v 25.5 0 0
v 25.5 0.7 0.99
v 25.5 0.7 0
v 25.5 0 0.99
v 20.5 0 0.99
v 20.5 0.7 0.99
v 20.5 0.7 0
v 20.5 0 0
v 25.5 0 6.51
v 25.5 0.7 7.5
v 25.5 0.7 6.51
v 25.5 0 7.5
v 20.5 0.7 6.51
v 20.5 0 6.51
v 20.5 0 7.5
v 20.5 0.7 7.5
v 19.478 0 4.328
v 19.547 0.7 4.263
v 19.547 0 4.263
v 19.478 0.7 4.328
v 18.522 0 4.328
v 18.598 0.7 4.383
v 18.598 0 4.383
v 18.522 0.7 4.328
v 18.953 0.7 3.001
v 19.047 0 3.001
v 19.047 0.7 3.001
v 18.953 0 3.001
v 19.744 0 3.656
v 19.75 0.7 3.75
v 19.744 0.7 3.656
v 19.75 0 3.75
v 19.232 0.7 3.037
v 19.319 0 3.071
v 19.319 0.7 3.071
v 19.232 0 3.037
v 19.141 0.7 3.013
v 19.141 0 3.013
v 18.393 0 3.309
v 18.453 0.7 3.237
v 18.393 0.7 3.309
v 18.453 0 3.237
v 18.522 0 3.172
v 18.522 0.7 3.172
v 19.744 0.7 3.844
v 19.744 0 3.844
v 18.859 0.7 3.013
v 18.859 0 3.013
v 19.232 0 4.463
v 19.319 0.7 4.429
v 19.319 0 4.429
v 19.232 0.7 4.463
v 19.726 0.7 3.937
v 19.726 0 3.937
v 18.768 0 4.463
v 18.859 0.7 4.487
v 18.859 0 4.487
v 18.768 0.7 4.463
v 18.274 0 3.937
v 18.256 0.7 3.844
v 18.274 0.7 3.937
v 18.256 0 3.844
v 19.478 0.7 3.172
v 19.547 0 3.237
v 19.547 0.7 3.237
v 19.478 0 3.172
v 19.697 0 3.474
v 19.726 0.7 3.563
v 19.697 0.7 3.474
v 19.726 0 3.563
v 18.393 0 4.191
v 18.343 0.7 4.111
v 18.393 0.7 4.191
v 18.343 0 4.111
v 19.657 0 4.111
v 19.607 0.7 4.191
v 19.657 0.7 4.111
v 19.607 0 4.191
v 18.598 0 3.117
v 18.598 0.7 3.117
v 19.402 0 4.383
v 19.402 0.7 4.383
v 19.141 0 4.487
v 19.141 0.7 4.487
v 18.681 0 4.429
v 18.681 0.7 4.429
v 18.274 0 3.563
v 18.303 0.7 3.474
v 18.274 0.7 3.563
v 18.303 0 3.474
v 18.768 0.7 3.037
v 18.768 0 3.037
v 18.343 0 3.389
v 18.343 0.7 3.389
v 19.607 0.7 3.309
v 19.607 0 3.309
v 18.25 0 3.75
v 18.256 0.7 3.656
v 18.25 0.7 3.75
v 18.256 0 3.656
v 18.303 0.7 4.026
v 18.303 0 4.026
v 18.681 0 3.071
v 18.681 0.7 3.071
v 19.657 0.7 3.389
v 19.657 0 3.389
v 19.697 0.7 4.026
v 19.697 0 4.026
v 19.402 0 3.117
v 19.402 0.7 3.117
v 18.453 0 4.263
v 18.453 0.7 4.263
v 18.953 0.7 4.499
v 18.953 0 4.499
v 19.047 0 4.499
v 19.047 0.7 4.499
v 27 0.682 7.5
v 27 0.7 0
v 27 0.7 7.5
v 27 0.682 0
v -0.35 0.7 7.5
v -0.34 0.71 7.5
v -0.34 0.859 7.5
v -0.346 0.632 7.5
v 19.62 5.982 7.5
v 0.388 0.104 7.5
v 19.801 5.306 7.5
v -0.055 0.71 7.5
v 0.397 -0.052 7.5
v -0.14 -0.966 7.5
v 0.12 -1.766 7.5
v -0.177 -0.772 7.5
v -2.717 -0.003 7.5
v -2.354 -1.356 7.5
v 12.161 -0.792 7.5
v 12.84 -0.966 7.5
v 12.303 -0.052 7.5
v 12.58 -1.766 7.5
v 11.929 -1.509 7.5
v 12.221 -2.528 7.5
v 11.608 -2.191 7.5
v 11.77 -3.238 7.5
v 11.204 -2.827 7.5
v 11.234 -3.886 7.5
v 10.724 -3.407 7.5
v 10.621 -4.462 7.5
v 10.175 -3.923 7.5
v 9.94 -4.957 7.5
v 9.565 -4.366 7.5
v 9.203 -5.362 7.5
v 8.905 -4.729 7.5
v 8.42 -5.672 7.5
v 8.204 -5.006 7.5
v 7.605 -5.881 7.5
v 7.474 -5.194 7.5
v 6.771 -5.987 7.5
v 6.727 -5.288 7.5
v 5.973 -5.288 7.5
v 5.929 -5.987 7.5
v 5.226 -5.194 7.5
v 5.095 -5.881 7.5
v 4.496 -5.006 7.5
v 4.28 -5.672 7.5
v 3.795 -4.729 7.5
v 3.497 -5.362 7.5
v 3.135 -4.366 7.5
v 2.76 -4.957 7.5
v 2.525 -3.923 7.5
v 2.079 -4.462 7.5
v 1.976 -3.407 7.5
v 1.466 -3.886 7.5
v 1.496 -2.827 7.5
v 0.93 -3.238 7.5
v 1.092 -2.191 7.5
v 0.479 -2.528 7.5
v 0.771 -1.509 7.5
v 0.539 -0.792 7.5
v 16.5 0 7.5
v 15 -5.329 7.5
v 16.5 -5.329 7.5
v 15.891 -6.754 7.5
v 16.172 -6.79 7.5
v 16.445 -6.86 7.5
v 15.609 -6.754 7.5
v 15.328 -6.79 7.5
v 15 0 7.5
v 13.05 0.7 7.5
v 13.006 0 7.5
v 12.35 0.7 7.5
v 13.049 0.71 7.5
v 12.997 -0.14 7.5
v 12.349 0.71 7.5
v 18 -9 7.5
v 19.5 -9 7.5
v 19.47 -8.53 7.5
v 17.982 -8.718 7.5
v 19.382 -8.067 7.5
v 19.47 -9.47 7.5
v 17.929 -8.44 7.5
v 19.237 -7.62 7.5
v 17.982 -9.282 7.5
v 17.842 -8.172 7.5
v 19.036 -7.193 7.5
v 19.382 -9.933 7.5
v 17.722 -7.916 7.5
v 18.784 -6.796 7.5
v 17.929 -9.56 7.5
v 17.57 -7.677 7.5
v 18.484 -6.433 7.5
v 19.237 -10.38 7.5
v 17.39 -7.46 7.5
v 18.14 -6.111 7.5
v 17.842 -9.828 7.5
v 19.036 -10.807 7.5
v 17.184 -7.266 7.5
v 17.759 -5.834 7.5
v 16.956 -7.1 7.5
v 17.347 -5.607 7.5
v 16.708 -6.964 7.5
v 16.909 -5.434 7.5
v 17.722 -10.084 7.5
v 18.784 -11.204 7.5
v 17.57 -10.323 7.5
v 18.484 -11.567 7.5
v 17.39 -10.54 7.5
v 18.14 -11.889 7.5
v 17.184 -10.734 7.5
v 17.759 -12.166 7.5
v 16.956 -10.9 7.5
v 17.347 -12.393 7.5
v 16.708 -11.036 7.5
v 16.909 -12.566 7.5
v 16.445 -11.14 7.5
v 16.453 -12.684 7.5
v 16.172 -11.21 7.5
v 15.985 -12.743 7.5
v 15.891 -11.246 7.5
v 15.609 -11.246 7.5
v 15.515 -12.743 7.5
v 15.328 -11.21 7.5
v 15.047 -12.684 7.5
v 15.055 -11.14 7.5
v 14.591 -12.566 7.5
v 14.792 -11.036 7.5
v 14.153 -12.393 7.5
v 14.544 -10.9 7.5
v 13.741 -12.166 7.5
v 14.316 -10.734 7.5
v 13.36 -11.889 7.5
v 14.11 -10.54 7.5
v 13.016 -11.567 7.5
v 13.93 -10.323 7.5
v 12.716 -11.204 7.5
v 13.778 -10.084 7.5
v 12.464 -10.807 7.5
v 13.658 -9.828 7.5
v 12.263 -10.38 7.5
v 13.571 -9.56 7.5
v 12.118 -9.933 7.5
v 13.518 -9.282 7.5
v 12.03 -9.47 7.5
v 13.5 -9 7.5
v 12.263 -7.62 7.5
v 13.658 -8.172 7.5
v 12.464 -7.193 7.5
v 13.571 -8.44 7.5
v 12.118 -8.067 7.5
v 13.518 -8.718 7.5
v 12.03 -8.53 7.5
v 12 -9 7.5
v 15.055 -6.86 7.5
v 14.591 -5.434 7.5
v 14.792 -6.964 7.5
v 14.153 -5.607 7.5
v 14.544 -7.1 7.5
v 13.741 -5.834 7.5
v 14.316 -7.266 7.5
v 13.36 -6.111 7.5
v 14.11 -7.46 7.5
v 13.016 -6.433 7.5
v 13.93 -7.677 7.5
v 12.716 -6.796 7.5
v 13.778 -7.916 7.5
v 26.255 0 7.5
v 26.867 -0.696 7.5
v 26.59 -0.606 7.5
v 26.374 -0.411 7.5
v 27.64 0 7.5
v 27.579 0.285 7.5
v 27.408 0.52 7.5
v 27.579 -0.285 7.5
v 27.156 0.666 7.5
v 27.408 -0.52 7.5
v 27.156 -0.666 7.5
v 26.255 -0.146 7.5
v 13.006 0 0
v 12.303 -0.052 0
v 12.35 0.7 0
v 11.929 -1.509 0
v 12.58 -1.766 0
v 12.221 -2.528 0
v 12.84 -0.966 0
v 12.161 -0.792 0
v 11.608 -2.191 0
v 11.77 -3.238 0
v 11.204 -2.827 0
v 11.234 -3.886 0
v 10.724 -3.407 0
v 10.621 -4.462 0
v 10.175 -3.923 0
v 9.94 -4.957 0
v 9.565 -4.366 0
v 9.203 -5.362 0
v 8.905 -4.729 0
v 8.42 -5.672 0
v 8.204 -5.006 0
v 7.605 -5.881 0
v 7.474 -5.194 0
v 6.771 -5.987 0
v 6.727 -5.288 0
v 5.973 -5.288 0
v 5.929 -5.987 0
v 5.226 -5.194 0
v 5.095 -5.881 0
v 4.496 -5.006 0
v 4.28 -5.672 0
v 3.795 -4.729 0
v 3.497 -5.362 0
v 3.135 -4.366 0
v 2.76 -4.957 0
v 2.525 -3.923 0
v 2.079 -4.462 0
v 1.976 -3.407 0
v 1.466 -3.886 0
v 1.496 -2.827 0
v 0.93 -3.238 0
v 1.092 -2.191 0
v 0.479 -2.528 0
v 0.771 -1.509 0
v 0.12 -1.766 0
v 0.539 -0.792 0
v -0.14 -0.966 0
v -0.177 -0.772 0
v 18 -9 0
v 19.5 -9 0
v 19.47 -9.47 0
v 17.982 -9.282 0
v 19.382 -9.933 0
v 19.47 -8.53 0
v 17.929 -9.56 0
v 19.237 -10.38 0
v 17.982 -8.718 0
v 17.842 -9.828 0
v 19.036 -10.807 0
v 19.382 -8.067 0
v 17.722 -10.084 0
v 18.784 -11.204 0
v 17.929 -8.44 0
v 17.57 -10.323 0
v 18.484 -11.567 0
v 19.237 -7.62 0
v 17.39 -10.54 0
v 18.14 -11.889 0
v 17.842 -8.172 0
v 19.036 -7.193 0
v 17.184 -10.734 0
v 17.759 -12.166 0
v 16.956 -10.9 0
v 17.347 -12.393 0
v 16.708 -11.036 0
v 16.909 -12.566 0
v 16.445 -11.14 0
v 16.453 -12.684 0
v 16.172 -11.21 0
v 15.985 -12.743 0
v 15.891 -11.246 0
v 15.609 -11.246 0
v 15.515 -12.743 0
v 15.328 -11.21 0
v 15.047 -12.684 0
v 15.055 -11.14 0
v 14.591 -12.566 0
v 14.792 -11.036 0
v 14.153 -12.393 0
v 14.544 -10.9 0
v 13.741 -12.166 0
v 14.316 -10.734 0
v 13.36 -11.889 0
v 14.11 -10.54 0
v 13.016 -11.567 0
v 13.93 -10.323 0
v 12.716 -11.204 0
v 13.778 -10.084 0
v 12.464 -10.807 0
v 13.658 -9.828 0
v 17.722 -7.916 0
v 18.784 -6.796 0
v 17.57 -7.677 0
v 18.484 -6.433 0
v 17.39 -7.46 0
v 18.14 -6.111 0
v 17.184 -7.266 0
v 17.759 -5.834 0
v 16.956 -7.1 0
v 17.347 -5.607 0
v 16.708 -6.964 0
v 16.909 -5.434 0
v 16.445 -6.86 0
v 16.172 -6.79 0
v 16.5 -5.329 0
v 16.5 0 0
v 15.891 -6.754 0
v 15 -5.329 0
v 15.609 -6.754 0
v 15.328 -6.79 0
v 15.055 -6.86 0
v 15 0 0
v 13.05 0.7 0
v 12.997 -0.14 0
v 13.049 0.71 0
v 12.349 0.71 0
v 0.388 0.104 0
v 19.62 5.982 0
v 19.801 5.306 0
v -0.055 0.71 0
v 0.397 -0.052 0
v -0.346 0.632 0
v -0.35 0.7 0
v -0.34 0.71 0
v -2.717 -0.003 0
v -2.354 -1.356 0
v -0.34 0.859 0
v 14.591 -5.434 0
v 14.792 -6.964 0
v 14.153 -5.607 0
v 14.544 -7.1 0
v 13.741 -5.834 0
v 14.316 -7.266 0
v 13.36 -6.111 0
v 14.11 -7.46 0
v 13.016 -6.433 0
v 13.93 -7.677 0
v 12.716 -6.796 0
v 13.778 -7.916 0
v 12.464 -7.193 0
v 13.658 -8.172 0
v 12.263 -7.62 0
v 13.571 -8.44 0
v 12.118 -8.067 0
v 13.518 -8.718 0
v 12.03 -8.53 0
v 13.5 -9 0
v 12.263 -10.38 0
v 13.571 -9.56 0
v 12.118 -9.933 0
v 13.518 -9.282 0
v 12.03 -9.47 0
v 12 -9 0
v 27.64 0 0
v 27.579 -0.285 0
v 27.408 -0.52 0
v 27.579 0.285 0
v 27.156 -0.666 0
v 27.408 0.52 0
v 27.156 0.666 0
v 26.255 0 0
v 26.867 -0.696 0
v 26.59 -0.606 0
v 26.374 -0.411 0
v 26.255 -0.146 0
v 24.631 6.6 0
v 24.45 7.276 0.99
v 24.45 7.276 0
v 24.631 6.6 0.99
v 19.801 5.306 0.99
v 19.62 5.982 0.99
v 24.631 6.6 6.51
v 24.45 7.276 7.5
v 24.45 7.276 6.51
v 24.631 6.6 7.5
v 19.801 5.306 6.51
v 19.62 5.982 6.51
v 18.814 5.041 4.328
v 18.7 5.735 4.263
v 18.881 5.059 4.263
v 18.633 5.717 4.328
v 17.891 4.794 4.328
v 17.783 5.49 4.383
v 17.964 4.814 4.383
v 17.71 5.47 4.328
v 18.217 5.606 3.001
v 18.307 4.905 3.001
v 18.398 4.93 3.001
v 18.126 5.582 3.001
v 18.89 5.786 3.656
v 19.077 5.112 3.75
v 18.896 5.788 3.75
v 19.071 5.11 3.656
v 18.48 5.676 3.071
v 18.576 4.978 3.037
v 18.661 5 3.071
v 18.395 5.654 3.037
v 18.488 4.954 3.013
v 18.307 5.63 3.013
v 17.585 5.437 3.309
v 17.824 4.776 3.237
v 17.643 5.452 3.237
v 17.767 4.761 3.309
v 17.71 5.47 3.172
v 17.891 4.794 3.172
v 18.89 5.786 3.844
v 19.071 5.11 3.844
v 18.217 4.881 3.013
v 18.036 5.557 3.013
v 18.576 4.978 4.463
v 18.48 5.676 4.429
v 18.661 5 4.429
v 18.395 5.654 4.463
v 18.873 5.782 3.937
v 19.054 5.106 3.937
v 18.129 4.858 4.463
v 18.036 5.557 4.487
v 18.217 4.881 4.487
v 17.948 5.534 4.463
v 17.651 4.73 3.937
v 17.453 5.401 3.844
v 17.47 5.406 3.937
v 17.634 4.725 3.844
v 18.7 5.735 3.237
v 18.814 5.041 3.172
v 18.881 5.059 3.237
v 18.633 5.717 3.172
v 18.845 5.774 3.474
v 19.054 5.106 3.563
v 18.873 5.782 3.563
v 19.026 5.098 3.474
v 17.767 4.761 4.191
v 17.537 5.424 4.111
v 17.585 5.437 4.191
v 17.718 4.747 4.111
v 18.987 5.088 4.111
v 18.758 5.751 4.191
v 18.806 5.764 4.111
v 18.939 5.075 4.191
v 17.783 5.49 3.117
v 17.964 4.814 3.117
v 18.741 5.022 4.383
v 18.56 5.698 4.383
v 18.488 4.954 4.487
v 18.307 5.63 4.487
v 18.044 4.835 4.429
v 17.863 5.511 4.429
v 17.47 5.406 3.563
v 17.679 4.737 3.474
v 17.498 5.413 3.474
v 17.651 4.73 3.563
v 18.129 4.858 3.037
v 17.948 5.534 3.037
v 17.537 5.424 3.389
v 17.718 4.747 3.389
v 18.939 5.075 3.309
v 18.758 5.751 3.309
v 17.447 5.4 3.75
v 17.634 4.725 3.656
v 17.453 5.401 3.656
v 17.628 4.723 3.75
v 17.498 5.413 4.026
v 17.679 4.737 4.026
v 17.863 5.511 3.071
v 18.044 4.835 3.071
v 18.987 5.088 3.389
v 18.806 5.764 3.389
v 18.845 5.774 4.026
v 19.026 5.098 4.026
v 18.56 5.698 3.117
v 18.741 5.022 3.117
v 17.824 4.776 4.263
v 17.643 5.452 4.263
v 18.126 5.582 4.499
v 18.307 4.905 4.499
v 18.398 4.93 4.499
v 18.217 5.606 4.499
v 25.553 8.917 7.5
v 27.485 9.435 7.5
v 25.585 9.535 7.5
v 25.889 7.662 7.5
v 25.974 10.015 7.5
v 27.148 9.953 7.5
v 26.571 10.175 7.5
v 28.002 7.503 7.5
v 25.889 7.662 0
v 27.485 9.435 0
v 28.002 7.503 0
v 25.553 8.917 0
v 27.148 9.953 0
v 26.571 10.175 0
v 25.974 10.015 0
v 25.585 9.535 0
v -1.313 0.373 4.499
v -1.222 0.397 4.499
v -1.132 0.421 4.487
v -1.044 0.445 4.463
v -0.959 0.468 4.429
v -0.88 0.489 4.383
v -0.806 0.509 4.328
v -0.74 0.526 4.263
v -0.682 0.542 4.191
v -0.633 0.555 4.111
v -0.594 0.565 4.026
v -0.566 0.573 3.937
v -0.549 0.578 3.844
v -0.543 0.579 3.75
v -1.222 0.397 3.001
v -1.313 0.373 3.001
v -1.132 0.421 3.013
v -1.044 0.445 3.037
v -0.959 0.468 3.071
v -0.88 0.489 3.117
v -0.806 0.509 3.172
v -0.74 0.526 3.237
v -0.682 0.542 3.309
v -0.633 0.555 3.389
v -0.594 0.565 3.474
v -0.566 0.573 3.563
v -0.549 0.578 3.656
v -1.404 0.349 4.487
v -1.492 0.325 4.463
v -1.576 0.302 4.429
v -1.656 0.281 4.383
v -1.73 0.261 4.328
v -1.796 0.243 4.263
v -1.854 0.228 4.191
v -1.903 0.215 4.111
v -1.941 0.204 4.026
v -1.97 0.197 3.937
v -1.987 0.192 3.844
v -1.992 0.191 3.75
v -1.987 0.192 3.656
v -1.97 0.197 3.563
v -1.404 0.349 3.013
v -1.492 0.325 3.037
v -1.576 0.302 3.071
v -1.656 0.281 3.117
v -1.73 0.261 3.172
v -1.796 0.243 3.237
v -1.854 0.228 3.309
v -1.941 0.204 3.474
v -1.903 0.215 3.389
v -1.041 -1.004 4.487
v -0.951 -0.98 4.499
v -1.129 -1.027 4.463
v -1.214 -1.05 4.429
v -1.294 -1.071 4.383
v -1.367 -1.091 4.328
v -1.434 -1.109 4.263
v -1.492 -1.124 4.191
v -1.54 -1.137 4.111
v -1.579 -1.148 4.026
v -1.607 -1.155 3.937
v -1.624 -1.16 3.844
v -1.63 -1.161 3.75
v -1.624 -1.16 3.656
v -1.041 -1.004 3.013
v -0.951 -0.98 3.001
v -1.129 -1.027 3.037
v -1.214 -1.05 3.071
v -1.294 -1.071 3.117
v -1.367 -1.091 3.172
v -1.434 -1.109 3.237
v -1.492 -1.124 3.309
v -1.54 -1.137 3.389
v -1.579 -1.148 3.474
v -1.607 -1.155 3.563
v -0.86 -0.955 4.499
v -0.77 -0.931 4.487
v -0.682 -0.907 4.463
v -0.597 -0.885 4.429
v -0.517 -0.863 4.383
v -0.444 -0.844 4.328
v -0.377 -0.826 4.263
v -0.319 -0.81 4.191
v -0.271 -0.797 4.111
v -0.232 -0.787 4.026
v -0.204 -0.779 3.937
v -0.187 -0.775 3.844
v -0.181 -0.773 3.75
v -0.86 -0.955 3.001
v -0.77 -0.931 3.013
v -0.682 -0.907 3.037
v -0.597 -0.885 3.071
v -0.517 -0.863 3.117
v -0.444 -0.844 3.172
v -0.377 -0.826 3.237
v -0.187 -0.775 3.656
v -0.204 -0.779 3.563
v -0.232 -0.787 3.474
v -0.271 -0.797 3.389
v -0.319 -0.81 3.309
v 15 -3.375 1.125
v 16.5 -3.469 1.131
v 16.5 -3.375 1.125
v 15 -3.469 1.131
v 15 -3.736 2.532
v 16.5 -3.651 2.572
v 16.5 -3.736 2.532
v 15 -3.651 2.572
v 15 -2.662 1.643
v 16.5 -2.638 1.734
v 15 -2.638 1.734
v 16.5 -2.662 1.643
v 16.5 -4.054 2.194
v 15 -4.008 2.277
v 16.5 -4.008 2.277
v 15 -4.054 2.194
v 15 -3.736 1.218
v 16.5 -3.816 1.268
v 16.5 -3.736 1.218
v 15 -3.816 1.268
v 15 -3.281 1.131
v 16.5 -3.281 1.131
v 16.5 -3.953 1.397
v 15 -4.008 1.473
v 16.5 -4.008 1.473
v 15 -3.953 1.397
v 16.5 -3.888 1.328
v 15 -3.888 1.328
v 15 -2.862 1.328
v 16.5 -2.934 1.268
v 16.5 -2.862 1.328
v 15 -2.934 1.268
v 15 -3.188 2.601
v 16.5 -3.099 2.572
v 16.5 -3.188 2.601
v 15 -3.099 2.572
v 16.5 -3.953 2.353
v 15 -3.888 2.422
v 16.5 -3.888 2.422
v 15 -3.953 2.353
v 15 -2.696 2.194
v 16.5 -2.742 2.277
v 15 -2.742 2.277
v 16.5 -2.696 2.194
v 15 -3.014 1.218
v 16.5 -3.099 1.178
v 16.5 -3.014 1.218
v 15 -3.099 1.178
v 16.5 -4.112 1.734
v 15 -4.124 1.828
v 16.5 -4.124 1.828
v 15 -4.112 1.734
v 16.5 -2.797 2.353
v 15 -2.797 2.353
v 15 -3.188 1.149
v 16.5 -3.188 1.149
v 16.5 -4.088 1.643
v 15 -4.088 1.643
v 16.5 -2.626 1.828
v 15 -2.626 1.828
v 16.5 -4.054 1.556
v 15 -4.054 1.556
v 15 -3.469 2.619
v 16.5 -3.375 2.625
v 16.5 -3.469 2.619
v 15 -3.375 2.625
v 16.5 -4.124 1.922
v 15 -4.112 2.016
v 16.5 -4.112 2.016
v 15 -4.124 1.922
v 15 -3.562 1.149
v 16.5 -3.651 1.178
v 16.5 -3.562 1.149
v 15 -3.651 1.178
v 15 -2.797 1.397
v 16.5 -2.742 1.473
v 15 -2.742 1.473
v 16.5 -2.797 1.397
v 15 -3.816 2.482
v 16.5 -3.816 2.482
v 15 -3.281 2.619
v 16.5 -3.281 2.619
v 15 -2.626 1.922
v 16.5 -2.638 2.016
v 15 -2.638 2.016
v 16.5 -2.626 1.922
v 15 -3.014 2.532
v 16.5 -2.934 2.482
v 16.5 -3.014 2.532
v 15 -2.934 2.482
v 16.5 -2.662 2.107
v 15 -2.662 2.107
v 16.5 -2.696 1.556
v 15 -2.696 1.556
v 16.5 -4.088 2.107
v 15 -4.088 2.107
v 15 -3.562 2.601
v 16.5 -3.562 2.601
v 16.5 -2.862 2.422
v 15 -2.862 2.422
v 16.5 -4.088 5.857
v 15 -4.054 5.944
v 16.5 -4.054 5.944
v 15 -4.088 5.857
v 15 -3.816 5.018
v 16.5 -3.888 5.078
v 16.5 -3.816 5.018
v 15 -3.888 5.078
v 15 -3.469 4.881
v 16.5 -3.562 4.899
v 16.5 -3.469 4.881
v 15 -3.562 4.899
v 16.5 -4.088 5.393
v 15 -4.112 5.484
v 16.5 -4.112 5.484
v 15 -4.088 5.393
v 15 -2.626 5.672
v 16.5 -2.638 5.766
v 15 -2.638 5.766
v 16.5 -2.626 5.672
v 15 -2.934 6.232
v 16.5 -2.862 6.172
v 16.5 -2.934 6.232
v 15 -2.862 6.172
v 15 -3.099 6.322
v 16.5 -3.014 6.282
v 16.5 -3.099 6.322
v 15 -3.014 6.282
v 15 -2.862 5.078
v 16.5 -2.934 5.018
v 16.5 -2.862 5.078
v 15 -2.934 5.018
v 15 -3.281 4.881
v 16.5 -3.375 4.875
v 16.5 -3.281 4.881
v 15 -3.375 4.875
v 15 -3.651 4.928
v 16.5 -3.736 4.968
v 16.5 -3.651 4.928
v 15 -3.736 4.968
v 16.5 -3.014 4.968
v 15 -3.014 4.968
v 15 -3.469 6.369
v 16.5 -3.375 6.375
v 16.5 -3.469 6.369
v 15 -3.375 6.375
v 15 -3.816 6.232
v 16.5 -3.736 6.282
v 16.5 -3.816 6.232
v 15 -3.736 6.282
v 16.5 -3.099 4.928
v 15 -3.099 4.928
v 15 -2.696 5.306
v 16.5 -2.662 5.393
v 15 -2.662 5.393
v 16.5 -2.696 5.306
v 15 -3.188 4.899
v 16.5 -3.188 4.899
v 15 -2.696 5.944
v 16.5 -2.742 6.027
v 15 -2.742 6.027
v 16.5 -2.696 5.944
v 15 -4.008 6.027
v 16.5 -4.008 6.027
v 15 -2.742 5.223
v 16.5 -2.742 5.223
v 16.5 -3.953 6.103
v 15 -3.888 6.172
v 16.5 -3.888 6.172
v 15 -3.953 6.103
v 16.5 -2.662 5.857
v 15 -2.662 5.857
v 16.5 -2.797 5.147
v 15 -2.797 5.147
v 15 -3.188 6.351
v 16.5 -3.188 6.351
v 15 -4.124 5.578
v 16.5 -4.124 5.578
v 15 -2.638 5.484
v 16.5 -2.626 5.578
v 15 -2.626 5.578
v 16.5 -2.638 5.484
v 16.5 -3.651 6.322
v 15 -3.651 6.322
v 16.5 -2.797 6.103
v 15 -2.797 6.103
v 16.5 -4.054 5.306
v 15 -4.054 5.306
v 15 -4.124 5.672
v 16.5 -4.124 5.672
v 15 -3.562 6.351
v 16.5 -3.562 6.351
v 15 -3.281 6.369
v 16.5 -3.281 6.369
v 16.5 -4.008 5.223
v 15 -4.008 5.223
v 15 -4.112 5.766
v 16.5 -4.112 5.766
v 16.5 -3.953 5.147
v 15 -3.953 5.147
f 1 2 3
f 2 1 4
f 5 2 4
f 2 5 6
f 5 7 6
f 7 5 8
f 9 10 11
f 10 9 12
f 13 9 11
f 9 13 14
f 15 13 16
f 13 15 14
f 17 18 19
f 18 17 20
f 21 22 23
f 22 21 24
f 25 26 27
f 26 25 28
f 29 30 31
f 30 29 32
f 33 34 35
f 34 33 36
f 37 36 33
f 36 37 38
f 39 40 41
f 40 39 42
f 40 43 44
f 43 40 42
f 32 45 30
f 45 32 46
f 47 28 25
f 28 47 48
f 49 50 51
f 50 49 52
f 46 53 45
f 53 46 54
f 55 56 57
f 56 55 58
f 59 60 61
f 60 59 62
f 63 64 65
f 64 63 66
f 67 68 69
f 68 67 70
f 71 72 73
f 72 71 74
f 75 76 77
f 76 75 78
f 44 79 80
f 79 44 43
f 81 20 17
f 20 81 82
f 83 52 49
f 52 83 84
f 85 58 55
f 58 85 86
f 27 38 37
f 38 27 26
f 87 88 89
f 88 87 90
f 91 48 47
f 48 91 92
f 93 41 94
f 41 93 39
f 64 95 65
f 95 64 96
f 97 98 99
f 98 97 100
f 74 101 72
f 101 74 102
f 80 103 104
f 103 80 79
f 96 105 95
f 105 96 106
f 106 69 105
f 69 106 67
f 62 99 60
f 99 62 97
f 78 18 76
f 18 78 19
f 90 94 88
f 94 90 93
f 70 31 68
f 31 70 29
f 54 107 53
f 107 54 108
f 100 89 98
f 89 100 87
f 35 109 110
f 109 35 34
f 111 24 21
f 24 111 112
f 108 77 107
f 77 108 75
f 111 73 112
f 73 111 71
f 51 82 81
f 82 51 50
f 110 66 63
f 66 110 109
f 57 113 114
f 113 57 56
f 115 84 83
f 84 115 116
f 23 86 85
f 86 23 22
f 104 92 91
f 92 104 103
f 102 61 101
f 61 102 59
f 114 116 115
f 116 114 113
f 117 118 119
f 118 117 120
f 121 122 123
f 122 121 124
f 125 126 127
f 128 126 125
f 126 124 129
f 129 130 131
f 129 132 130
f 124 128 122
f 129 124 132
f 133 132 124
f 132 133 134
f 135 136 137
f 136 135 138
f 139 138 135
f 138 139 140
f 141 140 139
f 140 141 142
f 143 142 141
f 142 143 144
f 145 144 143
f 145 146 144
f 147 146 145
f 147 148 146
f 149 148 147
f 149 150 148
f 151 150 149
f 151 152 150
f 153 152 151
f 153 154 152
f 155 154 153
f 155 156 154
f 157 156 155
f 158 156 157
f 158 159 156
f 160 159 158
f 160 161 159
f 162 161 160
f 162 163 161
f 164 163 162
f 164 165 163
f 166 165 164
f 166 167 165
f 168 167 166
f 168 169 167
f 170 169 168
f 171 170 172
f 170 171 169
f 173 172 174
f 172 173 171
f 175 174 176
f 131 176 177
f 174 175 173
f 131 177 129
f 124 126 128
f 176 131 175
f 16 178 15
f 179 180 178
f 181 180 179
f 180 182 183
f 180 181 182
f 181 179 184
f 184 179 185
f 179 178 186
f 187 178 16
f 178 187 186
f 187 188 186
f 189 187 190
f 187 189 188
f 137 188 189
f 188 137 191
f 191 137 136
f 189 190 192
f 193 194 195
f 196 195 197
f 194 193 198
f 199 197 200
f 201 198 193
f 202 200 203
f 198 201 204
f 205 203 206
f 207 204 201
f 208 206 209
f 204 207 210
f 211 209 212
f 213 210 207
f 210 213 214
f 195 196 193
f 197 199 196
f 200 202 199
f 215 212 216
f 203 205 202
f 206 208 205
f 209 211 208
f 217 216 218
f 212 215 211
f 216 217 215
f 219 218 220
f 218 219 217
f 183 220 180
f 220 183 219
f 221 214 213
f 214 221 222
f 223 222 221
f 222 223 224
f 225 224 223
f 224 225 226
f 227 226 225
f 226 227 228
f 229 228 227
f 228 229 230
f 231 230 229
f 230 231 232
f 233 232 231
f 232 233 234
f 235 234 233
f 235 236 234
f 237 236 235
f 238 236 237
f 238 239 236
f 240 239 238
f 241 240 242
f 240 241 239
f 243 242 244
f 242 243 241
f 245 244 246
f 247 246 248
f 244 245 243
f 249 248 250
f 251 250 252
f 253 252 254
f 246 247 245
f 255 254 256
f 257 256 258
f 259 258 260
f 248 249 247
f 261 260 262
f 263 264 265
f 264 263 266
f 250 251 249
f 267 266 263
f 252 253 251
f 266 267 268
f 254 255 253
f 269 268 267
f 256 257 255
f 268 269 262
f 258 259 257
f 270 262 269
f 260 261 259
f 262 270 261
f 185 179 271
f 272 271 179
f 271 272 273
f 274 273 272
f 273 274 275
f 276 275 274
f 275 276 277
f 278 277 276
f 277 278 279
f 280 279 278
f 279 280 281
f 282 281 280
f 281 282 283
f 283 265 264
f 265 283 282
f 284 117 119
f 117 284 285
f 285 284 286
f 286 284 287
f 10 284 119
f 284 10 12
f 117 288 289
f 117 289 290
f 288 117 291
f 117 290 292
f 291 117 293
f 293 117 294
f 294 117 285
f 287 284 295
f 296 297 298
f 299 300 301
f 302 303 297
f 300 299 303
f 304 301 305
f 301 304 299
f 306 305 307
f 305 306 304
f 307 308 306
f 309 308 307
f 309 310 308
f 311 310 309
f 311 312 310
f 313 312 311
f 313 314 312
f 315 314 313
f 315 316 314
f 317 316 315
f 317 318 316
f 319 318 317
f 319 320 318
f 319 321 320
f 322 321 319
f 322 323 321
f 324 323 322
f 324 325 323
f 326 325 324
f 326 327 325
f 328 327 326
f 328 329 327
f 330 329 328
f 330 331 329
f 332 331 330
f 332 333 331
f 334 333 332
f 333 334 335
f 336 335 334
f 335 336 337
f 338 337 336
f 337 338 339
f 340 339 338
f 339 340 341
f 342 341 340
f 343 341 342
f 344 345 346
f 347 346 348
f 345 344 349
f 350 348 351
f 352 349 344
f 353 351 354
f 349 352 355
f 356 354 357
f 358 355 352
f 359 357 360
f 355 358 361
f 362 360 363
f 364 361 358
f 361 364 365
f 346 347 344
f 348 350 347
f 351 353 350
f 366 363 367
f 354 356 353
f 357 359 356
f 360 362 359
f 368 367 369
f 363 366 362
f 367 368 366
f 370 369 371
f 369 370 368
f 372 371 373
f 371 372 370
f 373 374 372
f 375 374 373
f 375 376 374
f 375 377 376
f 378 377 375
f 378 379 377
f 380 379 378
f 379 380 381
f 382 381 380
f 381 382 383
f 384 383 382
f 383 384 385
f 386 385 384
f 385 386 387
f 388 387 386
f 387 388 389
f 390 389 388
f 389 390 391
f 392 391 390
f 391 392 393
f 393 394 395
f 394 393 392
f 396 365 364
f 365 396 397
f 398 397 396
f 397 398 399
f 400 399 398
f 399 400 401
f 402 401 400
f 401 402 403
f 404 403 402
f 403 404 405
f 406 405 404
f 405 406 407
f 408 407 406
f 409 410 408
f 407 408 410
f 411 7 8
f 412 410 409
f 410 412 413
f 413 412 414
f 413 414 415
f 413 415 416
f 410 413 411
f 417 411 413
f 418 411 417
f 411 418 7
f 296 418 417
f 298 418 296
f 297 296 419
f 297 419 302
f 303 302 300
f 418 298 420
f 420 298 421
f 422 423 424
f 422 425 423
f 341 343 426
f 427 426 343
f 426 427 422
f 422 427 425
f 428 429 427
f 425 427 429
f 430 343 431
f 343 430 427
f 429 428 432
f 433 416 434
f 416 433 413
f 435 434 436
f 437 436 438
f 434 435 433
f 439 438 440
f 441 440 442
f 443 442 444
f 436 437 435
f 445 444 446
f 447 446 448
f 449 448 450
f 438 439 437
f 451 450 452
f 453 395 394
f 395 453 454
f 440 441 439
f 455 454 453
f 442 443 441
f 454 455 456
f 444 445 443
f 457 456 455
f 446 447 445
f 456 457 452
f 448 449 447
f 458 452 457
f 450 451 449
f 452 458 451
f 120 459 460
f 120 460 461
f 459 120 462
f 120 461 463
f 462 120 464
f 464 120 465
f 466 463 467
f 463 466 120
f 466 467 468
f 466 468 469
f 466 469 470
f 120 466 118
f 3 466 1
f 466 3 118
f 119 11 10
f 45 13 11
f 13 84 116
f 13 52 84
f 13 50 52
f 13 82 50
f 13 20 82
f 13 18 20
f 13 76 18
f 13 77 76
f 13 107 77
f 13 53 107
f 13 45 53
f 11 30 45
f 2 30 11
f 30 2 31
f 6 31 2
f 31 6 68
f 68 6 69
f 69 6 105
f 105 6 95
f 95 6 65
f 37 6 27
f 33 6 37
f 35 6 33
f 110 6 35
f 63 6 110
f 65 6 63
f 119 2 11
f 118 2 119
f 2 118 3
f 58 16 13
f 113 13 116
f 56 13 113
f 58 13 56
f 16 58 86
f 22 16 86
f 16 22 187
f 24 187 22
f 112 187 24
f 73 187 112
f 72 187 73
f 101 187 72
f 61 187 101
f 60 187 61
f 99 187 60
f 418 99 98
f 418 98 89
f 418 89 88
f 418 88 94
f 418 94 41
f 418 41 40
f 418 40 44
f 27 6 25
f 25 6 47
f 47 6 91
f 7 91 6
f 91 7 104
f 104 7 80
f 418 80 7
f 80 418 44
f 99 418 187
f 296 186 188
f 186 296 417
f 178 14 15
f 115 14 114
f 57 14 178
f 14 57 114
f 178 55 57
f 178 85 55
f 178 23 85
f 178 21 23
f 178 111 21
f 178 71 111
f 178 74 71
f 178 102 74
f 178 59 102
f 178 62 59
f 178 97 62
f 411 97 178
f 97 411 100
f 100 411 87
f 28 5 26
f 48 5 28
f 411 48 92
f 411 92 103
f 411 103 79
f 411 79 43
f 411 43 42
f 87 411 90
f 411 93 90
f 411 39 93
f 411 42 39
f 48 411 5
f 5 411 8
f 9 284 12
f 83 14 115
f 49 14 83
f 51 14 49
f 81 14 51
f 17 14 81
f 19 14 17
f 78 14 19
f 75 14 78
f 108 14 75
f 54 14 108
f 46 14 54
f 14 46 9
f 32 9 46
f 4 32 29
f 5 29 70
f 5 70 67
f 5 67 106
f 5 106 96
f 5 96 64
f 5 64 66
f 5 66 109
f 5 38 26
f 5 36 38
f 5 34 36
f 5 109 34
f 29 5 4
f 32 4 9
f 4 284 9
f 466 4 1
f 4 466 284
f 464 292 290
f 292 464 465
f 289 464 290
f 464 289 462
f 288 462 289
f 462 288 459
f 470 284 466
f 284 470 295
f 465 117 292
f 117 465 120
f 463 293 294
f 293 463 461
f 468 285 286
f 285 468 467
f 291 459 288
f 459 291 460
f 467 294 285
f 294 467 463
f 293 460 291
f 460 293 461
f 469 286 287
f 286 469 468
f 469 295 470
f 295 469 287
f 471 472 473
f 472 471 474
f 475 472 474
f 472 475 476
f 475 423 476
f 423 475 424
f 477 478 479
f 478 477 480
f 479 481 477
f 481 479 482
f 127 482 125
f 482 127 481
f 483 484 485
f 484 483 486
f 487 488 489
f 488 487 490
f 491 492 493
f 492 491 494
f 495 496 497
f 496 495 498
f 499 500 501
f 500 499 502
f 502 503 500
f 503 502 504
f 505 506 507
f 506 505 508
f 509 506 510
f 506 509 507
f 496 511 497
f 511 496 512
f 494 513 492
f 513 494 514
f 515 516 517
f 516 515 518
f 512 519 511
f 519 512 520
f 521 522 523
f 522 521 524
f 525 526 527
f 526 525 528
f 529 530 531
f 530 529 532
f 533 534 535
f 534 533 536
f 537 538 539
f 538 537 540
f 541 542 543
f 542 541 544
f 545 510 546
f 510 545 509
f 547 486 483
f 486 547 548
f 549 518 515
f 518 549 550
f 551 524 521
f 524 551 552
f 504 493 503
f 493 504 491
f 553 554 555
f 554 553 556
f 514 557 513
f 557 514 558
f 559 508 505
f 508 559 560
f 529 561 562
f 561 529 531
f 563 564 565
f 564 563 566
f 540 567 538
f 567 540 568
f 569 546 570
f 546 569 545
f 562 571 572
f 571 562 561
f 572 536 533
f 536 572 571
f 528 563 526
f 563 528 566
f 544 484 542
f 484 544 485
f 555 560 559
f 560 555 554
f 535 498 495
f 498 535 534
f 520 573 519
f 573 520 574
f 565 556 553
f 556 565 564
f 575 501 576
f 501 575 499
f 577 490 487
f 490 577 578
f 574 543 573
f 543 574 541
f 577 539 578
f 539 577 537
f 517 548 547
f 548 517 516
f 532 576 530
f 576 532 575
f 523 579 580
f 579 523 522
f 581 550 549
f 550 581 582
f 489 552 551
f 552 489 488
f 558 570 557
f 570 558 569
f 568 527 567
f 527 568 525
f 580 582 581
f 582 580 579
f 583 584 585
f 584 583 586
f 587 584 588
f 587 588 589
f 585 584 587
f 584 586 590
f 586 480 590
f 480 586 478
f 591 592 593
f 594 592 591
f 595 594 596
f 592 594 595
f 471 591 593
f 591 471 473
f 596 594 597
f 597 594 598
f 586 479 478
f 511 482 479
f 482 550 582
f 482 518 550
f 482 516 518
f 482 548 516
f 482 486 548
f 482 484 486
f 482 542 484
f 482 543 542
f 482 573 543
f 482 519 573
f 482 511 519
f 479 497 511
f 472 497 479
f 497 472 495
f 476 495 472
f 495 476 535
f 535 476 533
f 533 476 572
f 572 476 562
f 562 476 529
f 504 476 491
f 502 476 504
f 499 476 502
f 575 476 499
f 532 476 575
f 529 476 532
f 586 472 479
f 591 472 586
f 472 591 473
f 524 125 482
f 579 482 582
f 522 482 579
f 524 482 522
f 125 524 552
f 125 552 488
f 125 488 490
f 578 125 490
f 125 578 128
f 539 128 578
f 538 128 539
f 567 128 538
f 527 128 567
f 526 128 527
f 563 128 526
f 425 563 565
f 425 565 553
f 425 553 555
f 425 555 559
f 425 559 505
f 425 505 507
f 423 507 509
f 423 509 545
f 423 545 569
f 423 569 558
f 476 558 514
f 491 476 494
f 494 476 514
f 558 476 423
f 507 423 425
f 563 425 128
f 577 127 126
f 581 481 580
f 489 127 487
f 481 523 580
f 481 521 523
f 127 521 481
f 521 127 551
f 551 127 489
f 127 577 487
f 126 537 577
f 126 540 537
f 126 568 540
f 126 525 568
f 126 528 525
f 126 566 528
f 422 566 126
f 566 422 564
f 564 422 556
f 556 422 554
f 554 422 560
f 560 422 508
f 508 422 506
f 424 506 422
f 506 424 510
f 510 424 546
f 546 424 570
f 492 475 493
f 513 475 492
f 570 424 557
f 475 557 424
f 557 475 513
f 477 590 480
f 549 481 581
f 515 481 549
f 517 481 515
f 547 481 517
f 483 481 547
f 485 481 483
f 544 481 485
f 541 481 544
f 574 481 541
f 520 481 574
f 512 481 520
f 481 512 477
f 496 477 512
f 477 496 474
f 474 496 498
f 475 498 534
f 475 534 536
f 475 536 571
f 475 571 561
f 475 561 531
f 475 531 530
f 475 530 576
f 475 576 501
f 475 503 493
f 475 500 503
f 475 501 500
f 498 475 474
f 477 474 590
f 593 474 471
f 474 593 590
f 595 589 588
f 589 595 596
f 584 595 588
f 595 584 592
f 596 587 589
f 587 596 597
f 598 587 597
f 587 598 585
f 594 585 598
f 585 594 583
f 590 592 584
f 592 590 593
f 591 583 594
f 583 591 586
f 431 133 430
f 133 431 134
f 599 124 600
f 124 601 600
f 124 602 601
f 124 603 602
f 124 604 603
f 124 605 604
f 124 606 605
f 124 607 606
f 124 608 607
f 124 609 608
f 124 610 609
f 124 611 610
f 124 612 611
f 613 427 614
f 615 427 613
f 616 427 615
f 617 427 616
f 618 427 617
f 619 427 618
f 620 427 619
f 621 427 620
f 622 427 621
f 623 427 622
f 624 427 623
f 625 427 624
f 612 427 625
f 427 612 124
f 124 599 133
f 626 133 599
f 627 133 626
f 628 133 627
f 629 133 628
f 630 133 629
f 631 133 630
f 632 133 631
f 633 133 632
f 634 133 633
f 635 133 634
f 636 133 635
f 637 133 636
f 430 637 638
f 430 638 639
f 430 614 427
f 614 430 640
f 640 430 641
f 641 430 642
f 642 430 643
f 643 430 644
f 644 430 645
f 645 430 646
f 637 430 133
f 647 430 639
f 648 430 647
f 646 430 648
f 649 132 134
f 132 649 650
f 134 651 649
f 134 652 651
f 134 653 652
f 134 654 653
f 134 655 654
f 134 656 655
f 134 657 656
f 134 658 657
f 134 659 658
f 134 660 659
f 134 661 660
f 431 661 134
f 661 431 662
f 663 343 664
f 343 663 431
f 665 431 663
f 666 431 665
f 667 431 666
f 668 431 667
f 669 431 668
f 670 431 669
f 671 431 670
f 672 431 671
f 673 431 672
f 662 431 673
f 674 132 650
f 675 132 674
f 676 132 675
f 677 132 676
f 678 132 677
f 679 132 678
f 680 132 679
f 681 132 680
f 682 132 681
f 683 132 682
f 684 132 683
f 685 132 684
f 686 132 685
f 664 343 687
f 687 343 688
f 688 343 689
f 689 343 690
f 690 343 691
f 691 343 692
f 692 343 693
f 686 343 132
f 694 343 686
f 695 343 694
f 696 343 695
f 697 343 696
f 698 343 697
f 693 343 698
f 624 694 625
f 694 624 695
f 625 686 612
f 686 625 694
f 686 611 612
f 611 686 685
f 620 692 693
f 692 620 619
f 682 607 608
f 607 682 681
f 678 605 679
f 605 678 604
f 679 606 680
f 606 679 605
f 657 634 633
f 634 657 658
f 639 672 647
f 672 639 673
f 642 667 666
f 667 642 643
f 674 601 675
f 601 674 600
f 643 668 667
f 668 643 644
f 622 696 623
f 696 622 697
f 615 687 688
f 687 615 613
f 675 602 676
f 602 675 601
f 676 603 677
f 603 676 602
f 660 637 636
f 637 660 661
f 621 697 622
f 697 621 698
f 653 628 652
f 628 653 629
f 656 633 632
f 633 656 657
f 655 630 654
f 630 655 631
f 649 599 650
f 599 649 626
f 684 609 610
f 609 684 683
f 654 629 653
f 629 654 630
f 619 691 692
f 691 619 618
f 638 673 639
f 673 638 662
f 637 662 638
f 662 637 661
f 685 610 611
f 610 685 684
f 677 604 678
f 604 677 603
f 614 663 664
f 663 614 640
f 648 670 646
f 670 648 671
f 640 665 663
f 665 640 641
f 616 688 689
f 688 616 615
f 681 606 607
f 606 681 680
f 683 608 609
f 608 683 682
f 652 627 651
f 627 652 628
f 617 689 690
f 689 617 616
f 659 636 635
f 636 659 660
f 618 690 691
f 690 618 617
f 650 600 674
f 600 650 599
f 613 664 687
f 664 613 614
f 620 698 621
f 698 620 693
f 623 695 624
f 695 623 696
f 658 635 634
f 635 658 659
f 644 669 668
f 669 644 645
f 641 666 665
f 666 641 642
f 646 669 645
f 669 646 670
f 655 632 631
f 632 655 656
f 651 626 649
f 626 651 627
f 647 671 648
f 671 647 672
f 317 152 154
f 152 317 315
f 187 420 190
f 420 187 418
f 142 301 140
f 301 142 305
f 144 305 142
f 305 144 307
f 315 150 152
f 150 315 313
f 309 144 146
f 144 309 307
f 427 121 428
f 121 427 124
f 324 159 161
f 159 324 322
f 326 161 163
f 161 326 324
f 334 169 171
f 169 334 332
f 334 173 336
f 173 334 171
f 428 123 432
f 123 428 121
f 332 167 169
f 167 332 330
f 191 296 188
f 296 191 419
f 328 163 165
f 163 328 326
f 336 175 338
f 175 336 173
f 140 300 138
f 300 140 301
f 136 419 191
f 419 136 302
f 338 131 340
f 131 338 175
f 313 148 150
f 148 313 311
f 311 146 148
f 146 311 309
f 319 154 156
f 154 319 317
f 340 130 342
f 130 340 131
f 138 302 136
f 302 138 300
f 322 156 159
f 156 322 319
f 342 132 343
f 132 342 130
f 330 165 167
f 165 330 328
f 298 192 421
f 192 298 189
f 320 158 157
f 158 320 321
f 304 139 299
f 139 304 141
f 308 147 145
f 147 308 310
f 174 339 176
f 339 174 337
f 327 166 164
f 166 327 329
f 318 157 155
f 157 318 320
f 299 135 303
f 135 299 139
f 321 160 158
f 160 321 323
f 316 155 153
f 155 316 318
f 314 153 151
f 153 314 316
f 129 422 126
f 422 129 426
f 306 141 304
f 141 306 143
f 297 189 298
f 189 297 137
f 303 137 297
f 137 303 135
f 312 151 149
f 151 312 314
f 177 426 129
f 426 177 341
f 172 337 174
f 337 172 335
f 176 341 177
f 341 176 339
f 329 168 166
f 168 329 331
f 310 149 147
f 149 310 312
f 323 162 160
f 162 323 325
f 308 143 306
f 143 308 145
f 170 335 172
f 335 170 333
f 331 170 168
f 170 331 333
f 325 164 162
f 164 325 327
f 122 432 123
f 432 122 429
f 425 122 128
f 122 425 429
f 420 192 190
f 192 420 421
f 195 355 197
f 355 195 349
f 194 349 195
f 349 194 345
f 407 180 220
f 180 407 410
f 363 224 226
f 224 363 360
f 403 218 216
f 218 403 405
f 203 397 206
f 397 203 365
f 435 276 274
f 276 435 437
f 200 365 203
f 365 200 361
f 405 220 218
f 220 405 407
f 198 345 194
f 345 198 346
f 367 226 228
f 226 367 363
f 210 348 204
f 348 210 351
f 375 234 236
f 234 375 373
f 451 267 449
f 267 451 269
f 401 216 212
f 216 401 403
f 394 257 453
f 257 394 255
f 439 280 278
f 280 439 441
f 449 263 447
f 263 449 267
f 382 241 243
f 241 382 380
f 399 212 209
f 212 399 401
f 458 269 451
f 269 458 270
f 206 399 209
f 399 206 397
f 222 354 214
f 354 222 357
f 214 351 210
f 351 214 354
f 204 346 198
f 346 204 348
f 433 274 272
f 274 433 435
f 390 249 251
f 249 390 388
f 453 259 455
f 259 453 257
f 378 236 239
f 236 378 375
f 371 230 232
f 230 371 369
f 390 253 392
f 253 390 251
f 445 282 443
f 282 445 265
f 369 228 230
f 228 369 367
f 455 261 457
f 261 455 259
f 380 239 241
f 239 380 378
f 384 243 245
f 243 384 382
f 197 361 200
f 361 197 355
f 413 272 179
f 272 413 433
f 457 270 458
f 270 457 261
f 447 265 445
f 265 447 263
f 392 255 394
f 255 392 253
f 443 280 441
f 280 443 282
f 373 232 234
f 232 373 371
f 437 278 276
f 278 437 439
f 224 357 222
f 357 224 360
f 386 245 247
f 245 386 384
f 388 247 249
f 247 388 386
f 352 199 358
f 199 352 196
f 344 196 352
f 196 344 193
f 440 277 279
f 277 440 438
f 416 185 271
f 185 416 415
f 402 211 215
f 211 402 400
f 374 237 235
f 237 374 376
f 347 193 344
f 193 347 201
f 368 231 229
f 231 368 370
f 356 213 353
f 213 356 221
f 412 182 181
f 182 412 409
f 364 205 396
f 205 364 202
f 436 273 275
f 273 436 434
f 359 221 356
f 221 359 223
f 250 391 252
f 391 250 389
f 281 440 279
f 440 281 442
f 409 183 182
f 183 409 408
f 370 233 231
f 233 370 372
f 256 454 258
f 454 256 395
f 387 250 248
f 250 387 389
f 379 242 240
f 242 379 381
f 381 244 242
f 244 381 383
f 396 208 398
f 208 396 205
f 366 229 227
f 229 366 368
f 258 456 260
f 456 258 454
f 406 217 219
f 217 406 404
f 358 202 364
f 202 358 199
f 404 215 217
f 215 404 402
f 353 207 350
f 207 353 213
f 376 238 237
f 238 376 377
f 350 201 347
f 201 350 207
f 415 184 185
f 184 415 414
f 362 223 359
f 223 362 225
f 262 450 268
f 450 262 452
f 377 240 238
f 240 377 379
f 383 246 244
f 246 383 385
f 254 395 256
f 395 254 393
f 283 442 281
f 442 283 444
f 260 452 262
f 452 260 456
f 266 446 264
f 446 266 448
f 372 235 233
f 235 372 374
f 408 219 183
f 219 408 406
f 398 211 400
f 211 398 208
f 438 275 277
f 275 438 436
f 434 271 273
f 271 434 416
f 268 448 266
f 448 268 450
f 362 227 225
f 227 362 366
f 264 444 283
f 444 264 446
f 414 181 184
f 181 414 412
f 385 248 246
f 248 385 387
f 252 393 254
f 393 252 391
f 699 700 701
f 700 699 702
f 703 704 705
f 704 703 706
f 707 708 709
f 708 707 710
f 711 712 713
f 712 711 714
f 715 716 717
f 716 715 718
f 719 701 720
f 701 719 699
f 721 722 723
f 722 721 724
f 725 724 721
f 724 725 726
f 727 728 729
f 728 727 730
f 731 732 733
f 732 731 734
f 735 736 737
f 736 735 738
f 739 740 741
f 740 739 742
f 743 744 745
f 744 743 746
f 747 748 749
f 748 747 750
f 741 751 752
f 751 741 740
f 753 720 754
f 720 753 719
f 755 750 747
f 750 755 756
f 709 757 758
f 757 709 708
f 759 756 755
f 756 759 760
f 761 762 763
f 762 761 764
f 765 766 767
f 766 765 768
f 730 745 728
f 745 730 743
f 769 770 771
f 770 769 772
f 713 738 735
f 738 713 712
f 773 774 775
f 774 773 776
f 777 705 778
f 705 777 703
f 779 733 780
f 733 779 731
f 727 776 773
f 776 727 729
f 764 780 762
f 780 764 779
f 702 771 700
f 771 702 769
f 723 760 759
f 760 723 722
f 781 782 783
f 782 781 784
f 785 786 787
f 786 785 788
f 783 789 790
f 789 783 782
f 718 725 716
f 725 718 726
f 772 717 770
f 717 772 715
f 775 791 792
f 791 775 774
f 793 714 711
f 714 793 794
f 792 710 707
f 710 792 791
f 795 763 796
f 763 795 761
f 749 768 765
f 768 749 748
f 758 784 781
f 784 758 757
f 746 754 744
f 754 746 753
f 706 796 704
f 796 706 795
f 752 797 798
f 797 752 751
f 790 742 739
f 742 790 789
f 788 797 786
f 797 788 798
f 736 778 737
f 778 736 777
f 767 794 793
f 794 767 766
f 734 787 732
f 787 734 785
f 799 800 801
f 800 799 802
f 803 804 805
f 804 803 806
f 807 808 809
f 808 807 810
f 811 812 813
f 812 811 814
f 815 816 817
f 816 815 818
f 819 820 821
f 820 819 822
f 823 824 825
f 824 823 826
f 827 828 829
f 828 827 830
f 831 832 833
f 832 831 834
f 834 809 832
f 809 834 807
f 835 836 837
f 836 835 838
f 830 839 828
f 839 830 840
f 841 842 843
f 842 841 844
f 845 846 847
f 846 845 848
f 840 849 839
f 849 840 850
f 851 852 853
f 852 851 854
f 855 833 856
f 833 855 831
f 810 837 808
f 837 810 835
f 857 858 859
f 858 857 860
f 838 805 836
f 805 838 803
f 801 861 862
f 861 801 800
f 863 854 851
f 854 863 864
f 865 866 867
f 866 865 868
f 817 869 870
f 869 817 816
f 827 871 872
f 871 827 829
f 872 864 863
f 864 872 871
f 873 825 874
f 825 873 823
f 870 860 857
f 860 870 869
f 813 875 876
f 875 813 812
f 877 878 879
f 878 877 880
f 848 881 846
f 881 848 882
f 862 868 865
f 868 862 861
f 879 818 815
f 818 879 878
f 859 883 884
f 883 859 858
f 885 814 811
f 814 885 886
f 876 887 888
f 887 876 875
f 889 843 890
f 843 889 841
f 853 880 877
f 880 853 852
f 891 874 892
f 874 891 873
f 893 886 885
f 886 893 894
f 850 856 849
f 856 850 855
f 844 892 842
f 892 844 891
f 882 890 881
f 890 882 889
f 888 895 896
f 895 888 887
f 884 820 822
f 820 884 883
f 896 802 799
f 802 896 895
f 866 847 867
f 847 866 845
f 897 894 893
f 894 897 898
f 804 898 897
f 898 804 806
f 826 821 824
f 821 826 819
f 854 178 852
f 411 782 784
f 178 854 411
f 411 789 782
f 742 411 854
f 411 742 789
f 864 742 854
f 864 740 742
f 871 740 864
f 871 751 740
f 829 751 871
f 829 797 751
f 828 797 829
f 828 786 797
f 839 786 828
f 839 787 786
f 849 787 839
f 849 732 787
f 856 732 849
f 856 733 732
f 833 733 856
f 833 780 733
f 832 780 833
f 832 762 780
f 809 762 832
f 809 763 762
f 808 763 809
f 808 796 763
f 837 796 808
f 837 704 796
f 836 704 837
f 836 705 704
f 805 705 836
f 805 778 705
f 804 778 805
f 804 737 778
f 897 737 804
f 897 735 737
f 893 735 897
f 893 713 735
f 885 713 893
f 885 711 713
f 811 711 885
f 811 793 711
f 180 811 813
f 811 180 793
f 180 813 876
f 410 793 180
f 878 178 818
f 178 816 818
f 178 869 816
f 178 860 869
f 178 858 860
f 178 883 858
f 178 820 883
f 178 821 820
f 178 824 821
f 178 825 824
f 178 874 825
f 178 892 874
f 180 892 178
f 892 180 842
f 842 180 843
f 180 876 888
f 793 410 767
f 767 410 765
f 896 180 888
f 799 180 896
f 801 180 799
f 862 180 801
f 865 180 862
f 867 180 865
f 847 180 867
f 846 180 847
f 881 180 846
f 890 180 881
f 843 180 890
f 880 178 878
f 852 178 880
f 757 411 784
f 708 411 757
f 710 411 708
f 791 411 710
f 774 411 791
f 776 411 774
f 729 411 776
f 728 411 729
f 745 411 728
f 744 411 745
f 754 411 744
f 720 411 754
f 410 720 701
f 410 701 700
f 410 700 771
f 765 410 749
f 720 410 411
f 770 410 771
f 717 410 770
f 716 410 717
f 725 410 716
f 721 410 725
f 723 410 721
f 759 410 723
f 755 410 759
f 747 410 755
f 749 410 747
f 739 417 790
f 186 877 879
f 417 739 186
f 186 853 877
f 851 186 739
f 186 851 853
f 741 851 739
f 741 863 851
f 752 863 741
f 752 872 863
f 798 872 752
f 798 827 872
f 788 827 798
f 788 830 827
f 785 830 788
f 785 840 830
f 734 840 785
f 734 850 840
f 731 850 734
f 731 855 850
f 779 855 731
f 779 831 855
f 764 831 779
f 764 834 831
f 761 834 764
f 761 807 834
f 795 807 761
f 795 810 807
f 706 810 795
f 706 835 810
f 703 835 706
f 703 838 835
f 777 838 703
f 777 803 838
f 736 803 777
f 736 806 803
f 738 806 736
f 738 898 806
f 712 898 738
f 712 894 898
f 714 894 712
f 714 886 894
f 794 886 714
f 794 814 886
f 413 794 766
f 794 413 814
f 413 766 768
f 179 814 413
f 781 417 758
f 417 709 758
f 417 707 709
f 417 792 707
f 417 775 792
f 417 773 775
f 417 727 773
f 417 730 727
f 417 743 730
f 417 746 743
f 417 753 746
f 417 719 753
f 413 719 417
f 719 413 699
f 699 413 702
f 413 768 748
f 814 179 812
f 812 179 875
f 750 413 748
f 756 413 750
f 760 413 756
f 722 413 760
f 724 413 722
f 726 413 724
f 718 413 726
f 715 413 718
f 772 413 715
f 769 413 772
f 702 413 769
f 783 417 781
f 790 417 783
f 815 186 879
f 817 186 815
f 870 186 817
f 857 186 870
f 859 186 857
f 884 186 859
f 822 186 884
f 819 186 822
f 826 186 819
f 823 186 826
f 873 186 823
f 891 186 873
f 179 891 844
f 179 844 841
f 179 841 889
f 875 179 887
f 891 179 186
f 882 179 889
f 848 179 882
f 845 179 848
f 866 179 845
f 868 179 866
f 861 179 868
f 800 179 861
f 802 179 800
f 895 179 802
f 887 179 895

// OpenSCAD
/* RapSwitch
 * Copyright (c) 2012 by Krallinger Sebastian [s.krallinger+cc@gmail.com]
 * Dual-licensed under 
 * Creative Commons Attribution-ShareAlike 3.0 (CC BY-SA) [http://creativecommons.org/licenses/by-sa/3.0/]
 * and
 * GPL v2 or later [http://www.gnu.org/licenses/].
 */

$fn = 50;

OS = 0.01;

springThickness  = 0.7;
springR          = 6;

openingA         = 15;

switchSize       = [27,-1,7.5];

knobSize         = [2,3,switchSize[2]];

contactReduction = 1;
contactFrontOff  = 1.5;
contactLength    = 5;

screwHoleD       = 4.5;

genWallT         = 1.5;

cabelHoleD       = 1.5;




// ring with inner radius r and w as witth and h as heigt
module ring(r,w,h,center = false){
	difference() {
		union () {
			cylinder(r=r+w,h=h, center=center);
		}
		union () {
			translate([0, 0, -OS]) 
			cylinder(r=r,h=h+3*OS, center=center);
		}
	}
}
// ring(1,0.5,1);

module contactHolder(springSpace = 0, knob = false,cabelHolder = false) {
	difference() {
		union(){
			translate([springSpace, 0, 0]) 
			cube(size=[switchSize[0]-springSpace, springThickness, switchSize[2]], center=false);
			
		}
		union(){
			//contact coutouts
			for (i=[0:1]) {
				translate([switchSize[0] - contactFrontOff -contactLength, -OS, i*(switchSize[2]-contactReduction+2*OS)-OS]) 
					cube(size=[contactLength, springThickness+2*OS, contactReduction], center=false);
			}
			translate([switchSize[0] - contactFrontOff -contactLength - cabelHoleD, OS+springThickness, switchSize[2]/2]) rotate(a=90,v=[1,0,0]) 
				cylinder(r=cabelHoleD/2, h=springThickness+2*OS, center=false);
		}
	}

	if (knob) {
		translate([switchSize[0]-OS, 0, 0]) {
			translate([knobSize[0]/2, knobSize[1]- knobSize[0]/2, 0]) 
				cylinder(r=knobSize[0]/2, h=knobSize[2], center=false,$fn = 10);

			cube(size=knobSize-[0,knobSize[0]/2,0], center=false);
		}
	}
	else{ // ending for better pinting
		translate([switchSize[0]-OS, , 0]) 
		translate([knobSize[0]/2 - springThickness*1.5,0, 0]) 
			cylinder(r=springThickness, h=knobSize[2], center=false,$fn = 15);
	}

	if (cabelHolder) {
		translate([-cabelHoleD*1.75, -springThickness, 0]) {
			difference() {
				cube(size=[cabelHoleD*1.75, springThickness*2, switchSize[2]], center=false);
				
				#translate([cabelHoleD, -OS, switchSize[2]/2])  rotate(a=-90,v=[1,0,0]) 
					cylinder(r=cabelHoleD/2, h=springThickness*2 +2*OS, center=false);
			}
		}
	}
}




module springRing() {
	outerSpringR = springR+springThickness;
	//spring ring
	difference() {
		union(){
			ring(r=springR,w=springThickness,h=switchSize[2],center = false);
		}
		union(){
			translate([-outerSpringR+OS, +OS, -OS]) 
				cube(size=[(outerSpringR+OS)*2, outerSpringR+OS, switchSize[2]+2*OS], center=false);
		}
	}
}

module rapSwitch() {
	// lower clapm
	contactHolder(springSpace=springR*2+springThickness);

	// upper clamp
	rotate(a=openingA,v=[0,0,1]) 
	contactHolder(knob = true,cabelHolder = true);

	// srping ring
	translate([springR+springThickness/2, springThickness, 0])
	springRing();

	//screw and cabel holes
	screwHoleXdist = springR*1.5;
	screwHoleYdist = springR*2+genWallT+screwHoleD/2;
	translate([screwHoleYdist, 0, 0]) {
		// screw holde
		translate([0, -screwHoleXdist, switchSize[2]/2])
			ring(r=screwHoleD/2,w=genWallT,h=switchSize[2],center = true);
		translate([0,  -(screwHoleXdist - screwHoleD/2)/2,  switchSize[2]/2])
		difference() {
			cube(size=[genWallT, screwHoleXdist - screwHoleD/2, switchSize[2]], center=true);

			// cabel holes in the holder
			for (i=[-1,1]) {
				translate([0, 0, i*switchSize[2]/4])  rotate(a=90,v=[0,1,0]) 
					cylinder(r=cabelHoleD/2, h=genWallT+2*OS, center=true);
			}
		}
	}
}

rapSwitch();
